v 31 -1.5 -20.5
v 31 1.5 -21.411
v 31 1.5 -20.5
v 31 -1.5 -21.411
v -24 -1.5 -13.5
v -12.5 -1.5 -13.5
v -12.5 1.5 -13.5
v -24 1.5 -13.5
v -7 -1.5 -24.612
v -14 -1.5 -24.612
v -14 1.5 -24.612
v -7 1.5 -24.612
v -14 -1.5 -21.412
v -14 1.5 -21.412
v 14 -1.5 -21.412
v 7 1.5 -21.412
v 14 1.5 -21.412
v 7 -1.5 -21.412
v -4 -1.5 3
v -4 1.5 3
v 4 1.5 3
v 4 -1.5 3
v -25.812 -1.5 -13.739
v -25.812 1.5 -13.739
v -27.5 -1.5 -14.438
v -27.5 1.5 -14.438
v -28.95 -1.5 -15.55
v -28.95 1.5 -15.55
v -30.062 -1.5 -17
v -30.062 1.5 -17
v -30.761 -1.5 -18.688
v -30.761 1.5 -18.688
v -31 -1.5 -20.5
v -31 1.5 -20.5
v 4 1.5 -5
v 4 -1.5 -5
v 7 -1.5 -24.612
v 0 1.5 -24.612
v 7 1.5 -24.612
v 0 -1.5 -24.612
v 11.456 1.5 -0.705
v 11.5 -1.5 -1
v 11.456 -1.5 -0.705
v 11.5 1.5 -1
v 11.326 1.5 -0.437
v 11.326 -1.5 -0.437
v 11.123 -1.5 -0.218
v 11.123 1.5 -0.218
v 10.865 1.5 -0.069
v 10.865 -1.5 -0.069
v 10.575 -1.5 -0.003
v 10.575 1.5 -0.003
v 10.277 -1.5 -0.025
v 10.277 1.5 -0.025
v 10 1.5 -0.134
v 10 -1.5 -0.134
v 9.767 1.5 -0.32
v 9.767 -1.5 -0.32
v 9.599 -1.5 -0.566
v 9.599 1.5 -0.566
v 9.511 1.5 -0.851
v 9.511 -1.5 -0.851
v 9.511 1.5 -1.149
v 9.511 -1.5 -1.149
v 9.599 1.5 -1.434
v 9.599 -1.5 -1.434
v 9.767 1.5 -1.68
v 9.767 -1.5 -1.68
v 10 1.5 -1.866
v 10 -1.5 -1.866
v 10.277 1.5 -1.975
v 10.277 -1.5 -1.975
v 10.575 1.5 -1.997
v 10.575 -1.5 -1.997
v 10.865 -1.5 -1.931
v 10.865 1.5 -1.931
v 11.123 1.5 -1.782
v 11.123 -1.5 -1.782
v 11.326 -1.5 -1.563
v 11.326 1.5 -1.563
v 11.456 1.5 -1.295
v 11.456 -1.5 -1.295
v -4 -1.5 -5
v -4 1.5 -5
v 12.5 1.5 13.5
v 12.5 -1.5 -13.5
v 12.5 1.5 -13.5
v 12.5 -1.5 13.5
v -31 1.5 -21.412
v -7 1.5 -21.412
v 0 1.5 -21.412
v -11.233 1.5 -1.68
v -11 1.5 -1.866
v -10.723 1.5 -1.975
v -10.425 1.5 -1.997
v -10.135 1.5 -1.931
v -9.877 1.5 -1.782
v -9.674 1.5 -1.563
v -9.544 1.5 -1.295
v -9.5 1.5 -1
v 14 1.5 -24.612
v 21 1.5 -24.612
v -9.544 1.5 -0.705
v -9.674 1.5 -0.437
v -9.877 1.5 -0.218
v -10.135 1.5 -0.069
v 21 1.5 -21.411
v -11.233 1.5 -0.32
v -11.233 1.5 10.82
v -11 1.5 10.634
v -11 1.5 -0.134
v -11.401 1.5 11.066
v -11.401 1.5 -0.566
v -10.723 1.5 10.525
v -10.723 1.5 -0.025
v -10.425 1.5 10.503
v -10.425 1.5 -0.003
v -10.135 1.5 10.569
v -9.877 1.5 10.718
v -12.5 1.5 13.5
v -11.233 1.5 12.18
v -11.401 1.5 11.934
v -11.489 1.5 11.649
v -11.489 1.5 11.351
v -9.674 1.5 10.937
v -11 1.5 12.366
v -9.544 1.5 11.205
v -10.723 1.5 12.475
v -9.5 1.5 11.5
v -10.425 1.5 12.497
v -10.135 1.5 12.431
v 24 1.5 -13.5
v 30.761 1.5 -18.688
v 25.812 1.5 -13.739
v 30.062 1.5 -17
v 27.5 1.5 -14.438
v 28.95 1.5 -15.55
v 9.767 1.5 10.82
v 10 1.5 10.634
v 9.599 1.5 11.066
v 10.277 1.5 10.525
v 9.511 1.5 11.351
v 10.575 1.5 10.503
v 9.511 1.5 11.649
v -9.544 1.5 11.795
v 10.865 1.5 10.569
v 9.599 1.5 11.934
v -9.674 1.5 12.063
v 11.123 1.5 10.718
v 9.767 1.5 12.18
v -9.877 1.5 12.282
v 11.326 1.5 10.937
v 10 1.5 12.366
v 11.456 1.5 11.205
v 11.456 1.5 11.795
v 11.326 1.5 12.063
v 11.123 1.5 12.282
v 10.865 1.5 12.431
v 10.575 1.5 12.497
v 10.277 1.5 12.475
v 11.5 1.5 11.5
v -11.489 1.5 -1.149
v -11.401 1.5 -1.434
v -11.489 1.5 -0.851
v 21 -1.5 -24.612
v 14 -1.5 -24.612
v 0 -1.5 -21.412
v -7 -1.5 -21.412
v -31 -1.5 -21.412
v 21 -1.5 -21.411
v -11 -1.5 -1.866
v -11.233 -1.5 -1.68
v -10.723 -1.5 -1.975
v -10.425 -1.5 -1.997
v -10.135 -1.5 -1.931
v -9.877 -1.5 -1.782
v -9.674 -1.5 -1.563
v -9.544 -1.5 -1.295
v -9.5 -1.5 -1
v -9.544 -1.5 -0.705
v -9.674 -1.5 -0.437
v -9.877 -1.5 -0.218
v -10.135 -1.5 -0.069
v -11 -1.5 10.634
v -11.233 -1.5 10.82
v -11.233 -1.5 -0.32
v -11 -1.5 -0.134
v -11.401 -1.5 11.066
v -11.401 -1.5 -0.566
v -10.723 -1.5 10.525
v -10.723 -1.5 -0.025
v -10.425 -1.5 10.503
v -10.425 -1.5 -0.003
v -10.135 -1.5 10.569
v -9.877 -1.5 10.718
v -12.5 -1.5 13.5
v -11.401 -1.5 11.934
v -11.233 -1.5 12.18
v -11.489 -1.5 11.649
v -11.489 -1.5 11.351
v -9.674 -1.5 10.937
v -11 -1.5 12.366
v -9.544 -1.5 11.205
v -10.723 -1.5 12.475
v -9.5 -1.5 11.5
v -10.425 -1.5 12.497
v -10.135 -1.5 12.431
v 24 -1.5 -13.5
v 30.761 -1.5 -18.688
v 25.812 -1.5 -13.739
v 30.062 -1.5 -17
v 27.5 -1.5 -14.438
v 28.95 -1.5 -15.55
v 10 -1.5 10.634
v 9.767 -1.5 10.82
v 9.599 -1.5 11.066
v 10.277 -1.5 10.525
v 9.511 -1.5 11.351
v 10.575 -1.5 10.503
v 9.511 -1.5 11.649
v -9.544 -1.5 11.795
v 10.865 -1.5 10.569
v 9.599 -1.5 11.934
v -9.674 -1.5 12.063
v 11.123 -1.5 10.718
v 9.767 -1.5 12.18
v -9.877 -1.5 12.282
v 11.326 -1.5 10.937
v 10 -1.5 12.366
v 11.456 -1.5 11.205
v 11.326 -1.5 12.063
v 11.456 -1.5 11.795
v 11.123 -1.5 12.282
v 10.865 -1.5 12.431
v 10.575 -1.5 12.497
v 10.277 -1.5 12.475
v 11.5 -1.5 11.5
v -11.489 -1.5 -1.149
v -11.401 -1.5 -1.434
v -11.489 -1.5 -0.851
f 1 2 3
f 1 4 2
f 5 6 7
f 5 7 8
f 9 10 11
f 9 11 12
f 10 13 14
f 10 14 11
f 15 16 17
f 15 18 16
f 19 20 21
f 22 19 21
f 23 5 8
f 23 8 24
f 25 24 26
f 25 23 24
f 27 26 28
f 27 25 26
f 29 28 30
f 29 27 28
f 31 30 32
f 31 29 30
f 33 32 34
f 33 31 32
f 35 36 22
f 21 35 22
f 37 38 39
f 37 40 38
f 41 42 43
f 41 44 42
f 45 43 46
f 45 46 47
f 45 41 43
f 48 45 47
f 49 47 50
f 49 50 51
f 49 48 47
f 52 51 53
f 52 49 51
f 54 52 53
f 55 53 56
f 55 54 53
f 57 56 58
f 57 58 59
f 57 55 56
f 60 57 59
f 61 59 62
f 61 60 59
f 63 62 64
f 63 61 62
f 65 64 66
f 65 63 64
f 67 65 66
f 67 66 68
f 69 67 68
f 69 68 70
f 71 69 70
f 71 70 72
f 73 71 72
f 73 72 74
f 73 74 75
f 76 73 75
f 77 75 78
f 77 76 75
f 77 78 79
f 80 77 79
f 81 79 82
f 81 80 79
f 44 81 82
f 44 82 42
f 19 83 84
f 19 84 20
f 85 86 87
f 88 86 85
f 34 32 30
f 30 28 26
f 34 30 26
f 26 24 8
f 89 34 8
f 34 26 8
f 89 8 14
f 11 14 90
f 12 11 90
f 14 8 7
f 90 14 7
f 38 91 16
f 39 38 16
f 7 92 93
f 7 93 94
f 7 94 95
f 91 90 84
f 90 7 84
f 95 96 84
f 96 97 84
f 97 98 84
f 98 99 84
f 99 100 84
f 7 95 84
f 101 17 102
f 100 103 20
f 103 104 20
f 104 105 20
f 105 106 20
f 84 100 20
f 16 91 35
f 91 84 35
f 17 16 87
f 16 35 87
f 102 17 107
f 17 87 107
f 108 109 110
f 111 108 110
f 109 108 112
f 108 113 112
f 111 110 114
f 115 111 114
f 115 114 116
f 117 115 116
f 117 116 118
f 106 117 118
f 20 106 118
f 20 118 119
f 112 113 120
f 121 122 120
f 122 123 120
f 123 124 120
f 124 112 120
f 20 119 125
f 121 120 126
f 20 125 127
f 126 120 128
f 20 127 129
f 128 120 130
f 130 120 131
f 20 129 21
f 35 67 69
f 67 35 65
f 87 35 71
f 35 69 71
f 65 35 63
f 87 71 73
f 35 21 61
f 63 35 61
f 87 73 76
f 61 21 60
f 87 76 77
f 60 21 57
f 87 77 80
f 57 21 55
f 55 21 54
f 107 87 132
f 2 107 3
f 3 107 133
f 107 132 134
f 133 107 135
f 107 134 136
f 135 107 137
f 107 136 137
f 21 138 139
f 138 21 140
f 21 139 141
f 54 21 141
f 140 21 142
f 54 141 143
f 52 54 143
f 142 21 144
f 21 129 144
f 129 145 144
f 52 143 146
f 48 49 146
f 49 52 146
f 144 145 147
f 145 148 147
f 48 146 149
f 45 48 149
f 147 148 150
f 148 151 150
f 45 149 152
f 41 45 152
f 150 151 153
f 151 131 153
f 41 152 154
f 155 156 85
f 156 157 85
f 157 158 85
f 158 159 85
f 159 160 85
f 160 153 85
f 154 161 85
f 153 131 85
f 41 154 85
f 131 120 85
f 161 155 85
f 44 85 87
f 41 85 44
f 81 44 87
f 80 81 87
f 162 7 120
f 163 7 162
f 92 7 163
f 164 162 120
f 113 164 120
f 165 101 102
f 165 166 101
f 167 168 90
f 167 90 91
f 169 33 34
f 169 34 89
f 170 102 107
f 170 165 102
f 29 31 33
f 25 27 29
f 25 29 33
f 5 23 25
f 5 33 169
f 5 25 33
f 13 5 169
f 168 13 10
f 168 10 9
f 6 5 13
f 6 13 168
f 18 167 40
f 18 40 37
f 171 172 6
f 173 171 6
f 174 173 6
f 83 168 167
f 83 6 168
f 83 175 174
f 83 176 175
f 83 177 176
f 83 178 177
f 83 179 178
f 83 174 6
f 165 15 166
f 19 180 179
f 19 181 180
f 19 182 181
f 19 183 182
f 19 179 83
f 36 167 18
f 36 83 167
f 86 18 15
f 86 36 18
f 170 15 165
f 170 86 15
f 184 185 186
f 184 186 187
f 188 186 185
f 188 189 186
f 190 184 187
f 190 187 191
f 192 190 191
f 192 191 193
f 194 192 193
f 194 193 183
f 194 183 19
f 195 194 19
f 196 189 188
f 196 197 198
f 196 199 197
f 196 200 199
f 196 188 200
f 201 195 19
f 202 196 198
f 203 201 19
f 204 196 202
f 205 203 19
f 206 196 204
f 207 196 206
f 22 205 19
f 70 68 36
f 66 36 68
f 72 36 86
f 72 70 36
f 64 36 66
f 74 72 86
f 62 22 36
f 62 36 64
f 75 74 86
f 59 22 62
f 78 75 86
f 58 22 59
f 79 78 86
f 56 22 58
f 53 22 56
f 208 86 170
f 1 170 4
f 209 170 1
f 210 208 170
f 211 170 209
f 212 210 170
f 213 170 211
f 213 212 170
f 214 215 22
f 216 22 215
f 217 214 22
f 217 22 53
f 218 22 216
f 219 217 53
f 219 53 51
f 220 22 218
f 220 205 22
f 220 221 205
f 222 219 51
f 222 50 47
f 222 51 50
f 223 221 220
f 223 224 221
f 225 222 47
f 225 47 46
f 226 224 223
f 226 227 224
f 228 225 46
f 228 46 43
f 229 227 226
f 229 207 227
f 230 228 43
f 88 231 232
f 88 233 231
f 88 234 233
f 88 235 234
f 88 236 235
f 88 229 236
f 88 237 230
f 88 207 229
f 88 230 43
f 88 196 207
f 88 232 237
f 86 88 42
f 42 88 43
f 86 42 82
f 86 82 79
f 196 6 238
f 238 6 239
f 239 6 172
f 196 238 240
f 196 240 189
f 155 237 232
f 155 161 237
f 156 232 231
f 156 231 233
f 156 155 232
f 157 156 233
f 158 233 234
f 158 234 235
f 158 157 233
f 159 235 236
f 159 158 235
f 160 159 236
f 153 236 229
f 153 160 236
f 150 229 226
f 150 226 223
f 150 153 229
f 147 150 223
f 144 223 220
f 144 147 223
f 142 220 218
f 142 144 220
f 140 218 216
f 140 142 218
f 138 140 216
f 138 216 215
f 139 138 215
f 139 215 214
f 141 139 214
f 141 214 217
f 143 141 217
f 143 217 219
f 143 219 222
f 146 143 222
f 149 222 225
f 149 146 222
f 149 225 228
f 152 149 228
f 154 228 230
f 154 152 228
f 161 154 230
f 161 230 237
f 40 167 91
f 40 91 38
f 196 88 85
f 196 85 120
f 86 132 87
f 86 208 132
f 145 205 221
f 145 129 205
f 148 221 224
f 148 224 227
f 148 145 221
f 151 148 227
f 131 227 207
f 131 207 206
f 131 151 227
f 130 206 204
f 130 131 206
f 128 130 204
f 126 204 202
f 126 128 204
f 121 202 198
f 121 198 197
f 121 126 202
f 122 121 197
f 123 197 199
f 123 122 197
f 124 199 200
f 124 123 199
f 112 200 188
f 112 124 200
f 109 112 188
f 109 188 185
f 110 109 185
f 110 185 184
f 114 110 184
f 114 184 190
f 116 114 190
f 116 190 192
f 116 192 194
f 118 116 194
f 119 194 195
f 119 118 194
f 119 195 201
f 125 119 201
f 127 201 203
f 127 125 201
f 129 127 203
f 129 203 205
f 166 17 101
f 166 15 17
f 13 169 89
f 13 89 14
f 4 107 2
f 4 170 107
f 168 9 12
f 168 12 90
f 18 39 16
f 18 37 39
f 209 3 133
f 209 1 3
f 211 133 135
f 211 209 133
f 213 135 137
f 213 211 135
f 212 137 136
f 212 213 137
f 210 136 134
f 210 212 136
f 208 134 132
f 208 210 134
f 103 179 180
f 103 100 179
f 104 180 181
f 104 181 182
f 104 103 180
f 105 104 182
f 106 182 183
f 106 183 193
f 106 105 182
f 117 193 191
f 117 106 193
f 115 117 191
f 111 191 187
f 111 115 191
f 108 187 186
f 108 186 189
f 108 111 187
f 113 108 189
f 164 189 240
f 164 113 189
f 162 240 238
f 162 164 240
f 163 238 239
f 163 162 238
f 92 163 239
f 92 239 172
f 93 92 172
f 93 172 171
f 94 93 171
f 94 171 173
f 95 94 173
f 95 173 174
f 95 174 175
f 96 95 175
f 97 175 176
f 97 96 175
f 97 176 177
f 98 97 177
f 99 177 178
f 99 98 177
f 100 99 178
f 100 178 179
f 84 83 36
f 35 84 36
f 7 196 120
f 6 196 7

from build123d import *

# Parameters (mm, degrees)
F0_R     = 1
F0_W     = 8
F0_H     = 8
F1_DEPTH = 1.5


with BuildPart() as f1:
    # F0 (on Front) → F1 (new body, symmetric)
    with BuildSketch(Plane.XZ):
        with BuildLine():
            Line((12.5, -13.5), (12.5, 13.5))
            Line((12.5, 13.5), (-12.5, 13.5))
            Line((-12.5, 13.5), (-12.5, -13.5))
            Line((-12.5, -13.5), (-24, -13.5))
            ThreePointArc((-24, -13.5), (-28.949747, -15.550253), (-31, -20.5))
            Line((-31, -20.5), (-31, -21.411933))
            Line((-31, -21.411933), (-14, -21.411933))
            Line((-14, -21.411933), (-14, -24.611933))
            Line((-14, -24.611933), (-7, -24.611933))
            Line((-7, -24.611933), (-7, -21.411933))
            Line((-7, -21.411933), (0, -21.411933))
            Line((0, -21.411933), (0, -24.611933))
            Line((0, -24.611933), (7, -24.611933))
            Line((7, -24.611933), (7, -21.411933))
            Line((7, -21.411933), (14, -21.411933))
            Line((14, -21.411933), (14, -24.611933))
            Line((14, -24.611933), (21, -24.611933))
            Line((21, -24.611933), (21, -21.411113))
            Line((21, -21.411113), (31, -21.411378))
            Line((31, -21.411378), (31, -20.5))
            ThreePointArc((31, -20.5), (28.949747, -15.550253), (24, -13.5))
            Line((24, -13.5), (12.5, -13.5))
        make_face()
        with Locations((-10.5, -1)):
            Circle(F0_R, mode=Mode.SUBTRACT)
        with Locations((-10.5, 11.5)):
            Circle(F0_R, mode=Mode.SUBTRACT)
        with Locations((0, -1)):
            Rectangle(F0_W, F0_H, mode=Mode.SUBTRACT)
        with Locations((10.5, -1)):
            Circle(F0_R, mode=Mode.SUBTRACT)
        with Locations((10.5, 11.5)):
            Circle(F0_R, mode=Mode.SUBTRACT)
    extrude(amount=F1_DEPTH, both=True)


solid = f1.part
